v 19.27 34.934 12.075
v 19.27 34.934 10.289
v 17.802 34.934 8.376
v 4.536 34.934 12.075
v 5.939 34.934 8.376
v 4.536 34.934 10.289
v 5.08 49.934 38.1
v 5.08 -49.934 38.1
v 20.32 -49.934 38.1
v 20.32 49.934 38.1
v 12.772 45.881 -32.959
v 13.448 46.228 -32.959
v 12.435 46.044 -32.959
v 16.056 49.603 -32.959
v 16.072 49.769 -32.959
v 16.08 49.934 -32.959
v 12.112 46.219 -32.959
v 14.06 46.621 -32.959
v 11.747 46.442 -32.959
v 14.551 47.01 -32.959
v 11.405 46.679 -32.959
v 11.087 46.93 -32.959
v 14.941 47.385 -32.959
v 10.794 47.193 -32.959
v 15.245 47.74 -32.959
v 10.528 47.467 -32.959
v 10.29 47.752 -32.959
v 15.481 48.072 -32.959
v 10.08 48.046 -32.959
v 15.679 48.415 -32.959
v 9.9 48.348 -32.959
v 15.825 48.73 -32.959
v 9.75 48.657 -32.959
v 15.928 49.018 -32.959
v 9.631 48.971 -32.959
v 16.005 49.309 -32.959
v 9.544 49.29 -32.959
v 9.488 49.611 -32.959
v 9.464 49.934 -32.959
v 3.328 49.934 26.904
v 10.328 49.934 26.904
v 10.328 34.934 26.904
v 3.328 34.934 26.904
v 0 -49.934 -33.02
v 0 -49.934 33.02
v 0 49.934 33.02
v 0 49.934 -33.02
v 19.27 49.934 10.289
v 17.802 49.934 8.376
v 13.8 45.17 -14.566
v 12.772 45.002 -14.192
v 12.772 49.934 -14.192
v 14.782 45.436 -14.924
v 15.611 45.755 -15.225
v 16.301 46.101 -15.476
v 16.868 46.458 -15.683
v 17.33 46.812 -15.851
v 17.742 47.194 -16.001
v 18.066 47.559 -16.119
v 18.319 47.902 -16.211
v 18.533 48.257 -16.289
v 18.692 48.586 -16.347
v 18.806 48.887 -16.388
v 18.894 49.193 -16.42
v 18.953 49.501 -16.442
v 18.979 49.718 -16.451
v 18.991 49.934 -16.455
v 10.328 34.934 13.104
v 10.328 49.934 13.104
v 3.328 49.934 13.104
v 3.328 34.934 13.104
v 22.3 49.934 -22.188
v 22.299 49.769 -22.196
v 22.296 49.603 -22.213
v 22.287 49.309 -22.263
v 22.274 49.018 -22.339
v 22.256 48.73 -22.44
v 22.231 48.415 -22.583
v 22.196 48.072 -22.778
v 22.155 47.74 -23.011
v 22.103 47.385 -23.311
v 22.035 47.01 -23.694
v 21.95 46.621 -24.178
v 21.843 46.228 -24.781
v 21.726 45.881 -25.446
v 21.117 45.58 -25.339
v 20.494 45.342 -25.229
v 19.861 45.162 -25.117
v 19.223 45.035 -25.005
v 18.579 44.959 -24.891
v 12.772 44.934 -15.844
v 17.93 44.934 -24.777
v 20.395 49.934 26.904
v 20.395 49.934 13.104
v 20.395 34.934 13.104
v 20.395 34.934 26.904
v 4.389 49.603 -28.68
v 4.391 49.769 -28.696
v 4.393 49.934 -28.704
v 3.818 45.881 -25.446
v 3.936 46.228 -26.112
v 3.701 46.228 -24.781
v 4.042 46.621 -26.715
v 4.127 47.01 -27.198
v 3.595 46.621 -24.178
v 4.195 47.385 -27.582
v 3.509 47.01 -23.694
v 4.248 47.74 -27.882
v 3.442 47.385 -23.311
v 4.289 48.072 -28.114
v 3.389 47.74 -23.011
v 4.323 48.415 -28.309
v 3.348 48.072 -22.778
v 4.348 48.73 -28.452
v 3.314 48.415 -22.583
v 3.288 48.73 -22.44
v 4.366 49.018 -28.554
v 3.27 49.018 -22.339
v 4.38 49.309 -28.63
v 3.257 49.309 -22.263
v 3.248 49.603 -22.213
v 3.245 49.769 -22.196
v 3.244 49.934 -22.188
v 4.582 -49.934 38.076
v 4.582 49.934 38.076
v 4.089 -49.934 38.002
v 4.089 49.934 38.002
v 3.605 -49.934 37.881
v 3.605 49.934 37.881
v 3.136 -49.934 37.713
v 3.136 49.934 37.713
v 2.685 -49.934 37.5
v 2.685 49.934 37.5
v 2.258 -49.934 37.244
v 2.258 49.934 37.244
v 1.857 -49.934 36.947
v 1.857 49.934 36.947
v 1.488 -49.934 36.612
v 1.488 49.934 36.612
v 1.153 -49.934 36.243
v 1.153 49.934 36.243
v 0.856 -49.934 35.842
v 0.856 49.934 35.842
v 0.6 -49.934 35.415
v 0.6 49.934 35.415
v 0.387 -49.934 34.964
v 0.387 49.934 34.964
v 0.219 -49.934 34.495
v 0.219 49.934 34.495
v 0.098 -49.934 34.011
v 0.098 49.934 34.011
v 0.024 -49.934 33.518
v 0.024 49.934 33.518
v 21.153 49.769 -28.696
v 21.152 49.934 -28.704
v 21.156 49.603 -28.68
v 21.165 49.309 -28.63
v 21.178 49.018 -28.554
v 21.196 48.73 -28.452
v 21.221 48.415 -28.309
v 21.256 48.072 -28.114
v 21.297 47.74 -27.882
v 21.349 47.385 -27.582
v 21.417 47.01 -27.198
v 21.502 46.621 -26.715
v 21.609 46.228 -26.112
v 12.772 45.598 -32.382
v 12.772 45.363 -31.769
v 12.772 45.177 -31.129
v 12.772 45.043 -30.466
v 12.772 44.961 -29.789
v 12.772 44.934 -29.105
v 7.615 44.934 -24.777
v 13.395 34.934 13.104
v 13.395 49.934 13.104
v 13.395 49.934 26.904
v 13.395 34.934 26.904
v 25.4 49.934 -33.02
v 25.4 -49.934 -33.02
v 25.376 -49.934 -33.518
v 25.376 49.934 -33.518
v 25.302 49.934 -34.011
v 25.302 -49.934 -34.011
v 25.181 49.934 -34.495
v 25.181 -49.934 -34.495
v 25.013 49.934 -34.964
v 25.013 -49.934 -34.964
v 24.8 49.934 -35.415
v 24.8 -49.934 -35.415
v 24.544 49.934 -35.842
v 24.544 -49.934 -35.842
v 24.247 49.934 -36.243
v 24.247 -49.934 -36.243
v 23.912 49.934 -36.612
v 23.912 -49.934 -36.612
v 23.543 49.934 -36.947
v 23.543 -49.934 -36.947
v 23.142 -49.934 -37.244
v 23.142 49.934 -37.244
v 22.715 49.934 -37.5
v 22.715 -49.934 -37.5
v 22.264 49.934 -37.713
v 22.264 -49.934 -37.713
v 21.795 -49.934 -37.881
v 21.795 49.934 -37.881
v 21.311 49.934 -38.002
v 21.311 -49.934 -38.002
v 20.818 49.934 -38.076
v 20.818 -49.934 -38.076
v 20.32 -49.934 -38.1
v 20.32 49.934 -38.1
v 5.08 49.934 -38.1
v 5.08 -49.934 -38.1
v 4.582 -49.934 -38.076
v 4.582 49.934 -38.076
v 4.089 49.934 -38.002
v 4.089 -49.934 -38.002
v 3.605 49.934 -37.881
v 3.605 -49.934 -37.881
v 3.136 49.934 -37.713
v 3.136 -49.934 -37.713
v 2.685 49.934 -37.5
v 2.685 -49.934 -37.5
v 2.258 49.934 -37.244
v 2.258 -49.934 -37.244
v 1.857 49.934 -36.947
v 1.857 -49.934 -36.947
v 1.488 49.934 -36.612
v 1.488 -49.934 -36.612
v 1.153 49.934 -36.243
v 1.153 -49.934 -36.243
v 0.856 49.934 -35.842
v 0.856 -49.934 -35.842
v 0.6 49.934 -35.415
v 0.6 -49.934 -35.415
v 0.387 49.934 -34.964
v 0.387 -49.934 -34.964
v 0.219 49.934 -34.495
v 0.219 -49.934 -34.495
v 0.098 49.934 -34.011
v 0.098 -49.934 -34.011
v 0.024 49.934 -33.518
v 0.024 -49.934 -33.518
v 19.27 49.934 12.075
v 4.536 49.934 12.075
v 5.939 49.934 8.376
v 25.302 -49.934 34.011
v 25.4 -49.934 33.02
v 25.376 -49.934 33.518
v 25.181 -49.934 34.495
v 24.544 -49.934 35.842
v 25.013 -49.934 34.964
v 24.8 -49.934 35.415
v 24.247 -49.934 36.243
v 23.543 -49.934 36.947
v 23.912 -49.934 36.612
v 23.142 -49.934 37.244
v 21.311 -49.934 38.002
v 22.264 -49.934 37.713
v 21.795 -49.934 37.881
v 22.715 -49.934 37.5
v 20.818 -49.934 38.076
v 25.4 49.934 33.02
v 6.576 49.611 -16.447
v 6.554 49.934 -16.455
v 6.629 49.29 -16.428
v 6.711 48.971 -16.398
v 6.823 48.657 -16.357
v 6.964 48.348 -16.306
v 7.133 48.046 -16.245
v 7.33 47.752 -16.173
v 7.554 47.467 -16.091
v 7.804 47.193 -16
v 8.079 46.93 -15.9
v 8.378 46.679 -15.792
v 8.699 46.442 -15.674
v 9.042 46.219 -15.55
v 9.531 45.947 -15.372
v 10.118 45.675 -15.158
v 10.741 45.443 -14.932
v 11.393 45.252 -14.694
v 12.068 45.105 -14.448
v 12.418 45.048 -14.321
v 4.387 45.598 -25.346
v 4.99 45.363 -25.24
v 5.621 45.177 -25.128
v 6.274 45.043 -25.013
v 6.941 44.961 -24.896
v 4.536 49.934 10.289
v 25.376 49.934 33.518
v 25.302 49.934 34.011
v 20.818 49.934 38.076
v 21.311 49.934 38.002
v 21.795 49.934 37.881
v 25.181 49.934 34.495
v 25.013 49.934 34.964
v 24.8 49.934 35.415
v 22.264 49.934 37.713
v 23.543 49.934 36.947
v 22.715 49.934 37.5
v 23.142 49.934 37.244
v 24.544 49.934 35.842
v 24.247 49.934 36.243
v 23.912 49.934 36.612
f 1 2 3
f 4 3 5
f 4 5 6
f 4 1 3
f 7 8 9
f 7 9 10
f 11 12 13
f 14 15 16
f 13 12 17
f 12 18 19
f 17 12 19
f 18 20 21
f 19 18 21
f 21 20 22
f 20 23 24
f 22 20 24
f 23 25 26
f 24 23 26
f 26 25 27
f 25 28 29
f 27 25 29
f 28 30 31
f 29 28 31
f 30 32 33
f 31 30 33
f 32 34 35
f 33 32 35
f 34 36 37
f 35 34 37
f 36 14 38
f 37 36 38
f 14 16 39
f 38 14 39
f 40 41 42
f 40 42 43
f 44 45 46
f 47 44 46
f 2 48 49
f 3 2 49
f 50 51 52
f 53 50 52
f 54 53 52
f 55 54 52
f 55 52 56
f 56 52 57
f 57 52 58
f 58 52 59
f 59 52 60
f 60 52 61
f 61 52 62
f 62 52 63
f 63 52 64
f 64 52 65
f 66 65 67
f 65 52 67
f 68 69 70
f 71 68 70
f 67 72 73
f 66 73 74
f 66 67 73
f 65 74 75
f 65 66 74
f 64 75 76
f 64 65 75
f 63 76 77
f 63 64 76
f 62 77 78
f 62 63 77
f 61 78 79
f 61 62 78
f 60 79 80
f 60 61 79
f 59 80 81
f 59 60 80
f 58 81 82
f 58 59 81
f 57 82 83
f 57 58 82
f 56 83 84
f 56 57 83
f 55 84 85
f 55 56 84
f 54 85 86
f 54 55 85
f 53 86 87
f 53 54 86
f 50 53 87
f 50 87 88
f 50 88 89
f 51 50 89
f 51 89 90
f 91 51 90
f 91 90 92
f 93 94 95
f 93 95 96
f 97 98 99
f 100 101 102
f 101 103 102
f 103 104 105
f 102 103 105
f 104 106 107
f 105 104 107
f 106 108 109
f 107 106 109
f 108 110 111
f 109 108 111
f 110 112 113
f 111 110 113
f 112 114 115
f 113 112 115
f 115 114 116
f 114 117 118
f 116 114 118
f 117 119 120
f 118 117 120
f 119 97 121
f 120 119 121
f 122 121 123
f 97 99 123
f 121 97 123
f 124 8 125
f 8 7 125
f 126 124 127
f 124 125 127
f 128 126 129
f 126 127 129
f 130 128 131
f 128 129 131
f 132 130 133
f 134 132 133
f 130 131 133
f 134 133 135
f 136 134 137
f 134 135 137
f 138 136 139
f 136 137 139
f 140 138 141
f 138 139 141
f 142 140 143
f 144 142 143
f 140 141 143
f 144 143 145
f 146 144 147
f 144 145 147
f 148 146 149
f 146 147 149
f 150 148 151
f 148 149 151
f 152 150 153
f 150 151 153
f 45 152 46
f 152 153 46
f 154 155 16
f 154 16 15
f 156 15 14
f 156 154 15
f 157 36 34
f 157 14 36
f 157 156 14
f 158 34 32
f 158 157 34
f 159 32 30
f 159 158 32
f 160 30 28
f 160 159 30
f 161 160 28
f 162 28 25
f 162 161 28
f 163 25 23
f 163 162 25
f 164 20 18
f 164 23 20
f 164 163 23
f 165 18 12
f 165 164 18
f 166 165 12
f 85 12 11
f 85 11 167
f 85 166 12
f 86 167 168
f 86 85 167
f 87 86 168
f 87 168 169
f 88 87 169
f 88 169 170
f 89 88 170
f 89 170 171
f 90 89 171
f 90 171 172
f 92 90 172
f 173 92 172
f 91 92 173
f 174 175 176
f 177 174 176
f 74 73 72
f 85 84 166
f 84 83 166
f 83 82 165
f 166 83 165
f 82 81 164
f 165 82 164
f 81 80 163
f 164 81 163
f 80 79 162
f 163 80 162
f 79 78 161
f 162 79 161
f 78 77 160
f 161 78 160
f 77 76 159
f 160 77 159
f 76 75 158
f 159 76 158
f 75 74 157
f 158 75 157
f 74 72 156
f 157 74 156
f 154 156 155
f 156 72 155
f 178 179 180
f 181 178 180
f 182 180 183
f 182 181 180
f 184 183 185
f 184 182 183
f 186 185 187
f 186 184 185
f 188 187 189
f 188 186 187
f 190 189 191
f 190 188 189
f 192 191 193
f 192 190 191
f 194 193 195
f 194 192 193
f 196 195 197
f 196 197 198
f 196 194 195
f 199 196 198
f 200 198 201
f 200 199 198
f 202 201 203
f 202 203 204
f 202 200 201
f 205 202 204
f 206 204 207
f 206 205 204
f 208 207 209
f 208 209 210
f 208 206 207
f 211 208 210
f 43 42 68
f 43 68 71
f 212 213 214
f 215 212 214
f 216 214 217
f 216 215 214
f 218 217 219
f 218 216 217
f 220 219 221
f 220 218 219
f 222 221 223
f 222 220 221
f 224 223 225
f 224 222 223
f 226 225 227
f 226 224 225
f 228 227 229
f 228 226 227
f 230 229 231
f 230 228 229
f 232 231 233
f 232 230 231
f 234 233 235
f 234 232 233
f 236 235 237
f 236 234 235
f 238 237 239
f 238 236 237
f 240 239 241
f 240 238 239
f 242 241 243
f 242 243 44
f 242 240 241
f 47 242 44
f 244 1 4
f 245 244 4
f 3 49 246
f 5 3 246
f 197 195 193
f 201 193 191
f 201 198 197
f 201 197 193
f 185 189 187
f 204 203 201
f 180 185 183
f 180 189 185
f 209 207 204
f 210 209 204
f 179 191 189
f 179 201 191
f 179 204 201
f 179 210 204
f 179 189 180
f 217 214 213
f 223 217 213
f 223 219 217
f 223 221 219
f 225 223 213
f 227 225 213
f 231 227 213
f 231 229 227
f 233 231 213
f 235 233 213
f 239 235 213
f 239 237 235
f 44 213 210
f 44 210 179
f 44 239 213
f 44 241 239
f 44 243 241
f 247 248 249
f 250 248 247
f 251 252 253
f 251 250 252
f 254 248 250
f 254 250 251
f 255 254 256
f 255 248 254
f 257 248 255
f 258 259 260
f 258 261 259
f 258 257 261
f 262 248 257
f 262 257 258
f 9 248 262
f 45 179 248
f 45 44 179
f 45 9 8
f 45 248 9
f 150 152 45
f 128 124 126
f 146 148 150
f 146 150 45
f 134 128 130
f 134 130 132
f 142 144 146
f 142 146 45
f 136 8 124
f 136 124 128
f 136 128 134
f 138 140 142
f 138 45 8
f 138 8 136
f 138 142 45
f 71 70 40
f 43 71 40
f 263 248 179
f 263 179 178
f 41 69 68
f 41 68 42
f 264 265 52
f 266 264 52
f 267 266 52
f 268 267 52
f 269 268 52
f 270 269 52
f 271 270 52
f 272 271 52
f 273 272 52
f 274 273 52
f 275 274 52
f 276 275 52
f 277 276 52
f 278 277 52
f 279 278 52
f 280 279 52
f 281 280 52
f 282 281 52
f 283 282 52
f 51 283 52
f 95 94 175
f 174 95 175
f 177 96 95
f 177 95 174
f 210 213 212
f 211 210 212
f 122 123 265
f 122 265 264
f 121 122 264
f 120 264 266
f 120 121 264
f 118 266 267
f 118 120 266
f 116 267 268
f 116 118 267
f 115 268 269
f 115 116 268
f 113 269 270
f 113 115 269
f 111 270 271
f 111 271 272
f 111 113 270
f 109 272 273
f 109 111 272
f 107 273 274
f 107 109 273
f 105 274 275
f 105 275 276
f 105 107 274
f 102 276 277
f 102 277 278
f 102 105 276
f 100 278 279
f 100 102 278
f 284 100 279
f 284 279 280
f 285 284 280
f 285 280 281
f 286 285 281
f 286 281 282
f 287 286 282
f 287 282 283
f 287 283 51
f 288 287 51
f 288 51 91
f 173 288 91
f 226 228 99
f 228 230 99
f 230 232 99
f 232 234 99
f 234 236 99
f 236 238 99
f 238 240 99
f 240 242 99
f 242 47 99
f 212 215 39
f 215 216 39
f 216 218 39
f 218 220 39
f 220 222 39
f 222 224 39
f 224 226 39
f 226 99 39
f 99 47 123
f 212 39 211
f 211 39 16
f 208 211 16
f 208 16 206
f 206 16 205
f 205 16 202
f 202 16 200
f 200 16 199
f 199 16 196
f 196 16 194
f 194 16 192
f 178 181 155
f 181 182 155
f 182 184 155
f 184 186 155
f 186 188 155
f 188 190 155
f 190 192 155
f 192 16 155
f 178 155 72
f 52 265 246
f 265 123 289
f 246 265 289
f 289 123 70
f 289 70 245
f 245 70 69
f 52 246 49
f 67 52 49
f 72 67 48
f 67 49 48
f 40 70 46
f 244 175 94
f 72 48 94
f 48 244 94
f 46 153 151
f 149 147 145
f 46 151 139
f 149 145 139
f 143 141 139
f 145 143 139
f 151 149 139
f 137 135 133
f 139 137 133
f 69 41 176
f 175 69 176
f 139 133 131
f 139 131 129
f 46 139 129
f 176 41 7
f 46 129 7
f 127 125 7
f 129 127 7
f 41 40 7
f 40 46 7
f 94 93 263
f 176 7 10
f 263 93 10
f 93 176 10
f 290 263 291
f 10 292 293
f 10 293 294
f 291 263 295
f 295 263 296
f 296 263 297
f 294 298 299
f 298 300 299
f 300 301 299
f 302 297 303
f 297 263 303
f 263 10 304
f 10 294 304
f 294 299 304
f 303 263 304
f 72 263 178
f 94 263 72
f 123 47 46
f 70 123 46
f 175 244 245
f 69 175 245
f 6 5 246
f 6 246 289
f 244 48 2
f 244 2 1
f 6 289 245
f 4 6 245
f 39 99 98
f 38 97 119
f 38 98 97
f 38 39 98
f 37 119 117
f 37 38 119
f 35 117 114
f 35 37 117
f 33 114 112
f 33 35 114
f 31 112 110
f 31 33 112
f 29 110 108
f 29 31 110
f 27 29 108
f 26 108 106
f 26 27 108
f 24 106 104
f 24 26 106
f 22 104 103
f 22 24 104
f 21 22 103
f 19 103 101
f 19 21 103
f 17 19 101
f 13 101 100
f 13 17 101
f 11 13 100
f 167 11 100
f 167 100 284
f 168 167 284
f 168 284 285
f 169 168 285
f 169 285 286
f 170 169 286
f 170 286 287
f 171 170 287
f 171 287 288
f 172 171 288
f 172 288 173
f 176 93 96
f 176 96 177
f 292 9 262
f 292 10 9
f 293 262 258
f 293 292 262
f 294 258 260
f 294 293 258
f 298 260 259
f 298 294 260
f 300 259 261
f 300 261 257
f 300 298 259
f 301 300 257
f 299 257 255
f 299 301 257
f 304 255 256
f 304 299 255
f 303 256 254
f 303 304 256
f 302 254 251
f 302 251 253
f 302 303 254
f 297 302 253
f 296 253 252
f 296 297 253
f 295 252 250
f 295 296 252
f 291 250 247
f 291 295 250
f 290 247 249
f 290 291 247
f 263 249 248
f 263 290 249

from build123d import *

# Parameters (mm, degrees)
F0_W          = 99.8685956001
F0_H          = 76.2
F1_DEPTH      = 25.4
F2_R          = 5.08
F3_R          = 5.08
F4_R          = 5.08
F5_R          = 5.08
F6_W          = 7
F6_H          = 13.8
F7_DEPTH      = 15
F8_W          = 14.7339338437
F8_H          = 1.7859311774
F9_DEPTH      = 15
F11_DEPTH     = 5
F12_T4_DEPTH  = 32.018367851
F12_T10_DEPTH = 32.018367851
F12_T17_DEPTH = 32.018367851
F12_T23_DEPTH = 32.018367851


# Not quite as in the source:
# - a fillet or chamfer that OpenCascade refuses, or shapes differently, is made with other operations: its cross-section is extruded or revolved along the edge and cut away or added


with BuildPart() as f1:
    # F0 (on Right) → F1 (new body)
    with BuildSketch(Plane.YZ):
        Rectangle(F0_W, F0_H)
    extrude(amount=F1_DEPTH)

    # F2
    f2_edges = [f1.edges().sort_by_distance(p)[0] for p in [
        (25.4, 0, 38.1),
    ]]
    fillet(f2_edges, radius=F2_R)

    # F3
    f3_edges = [f1.edges().sort_by_distance(p)[0] for p in [
        (0, 0, 38.1),
    ]]
    fillet(f3_edges, radius=F3_R)

    # F4
    f4_edges = [f1.edges().sort_by_distance(p)[0] for p in [
        (25.4, 0, -38.1),
    ]]
    fillet(f4_edges, radius=F4_R)

    # F5
    f5_edges = [f1.edges().sort_by_distance(p)[0] for p in [
        (0, 0, -38.1),
    ]]
    fillet(f5_edges, radius=F5_R)

    # F6 (on face) → F7 (cut)
    with BuildSketch(Plane(origin=(0, 49.9342978001, 0), x_dir=(-1, 0, 0), z_dir=(0, 1, 0))):
        with Locations((-6.8276954116, 20.0042553112)):
            Rectangle(F6_W, F6_H)
        with Locations((-16.8951429576, 20.0042553112)):
            Rectangle(F6_W, F6_H)
    extrude(amount=-F7_DEPTH, mode=Mode.SUBTRACT)

    # F8 (on face) → F9 (cut)
    with BuildSketch(Plane(origin=(0, 49.9342978001, 0), x_dir=(-1, 0, 0), z_dir=(0, 1, 0))):
        with Locations((-11.9025348686, 11.1820721067)):
            Rectangle(F8_W, F8_H)
        Polygon((-4.5355679467, 10.289106518), (-19.2695017904, 10.289106518), (-17.8024861962, 8.3756083623), (-5.9387991205, 8.3756083623), align=None)
    extrude(amount=-F9_DEPTH, mode=Mode.SUBTRACT)

    # F10 (on face) → F11 (cut)
    with BuildSketch(Plane(origin=(0, 49.9342978001, 0), x_dir=(-1, 0, 0), z_dir=(0, 1, 0))):
        Polygon((-16.0813947992, -32.9593643546), (-9.4630269482, -32.9593643546), (-4.3930630334, -28.7051595036), (-3.2437955169, -22.1873395316), (-6.5529794424, -16.4556648411), (-12.7722108737, -14.1920497201), (-18.9914423049, -16.4556648411), (-22.3006262304, -22.1873395316), (-21.151358714, -28.7051595036), align=None)
    extrude(amount=-F11_DEPTH, mode=Mode.SUBTRACT)

    # F12: fillet of radius 5.08 on 4 edges, made by hand


with BuildPart() as f12_tool2:
    # F12_s3 → F12_t4 (new body)
    with BuildSketch(Plane(origin=(5.5233724705, 0, -9.566761748), x_dir=(0, 1, 0), z_dir=(0.5, 0, -0.8660254038))):
        with BuildLine():
            ThreePointArc((50.0142978001, 8.21923907), (46.4221953516, 6.7313415185), (44.9342978001, 3.13923907))
            Line((44.9342978001, 3.13923907), (44.9342978001, 8.21923907))
            Line((44.9342978001, 8.21923907), (50.0142978001, 8.21923907))
        make_face()
    extrude(amount=F12_T4_DEPTH)

    split(bisect_by=Plane.XZ.offset(-49.9342978001), keep=Keep.TOP)

    split(bisect_by=Plane(origin=(25.4224385924, 0, -4.4826618392), x_dir=(0, 1, 0), z_dir=(-0.984807753, 0, 0.1736481777)), keep=Keep.TOP)


with BuildPart() as f1_1:
    add(f1.part)

    # F12_t1: union F12_tool2
    add(f12_tool2.part)


with BuildPart() as f12_tool8:
    # F12_s9 → F12_t10 (new body)
    with BuildSketch(Plane(origin=(31.5112153695, 0, -26.4410491945), x_dir=(0, 1, 0), z_dir=(-0.7660444431, 0, 0.6427876097))):
        with BuildLine():
            ThreePointArc((50.0142978001, 19.1656214402), (46.4221953516, 17.6777238886), (44.9342978001, 14.0856214402))
            Line((44.9342978001, 14.0856214402), (44.9342978001, 19.1656214402))
            Line((44.9342978001, 19.1656214402), (50.0142978001, 19.1656214402))
        make_face()
    extrude(amount=F12_T10_DEPTH)

    split(bisect_by=Plane.XZ.offset(-49.9342978001), keep=Keep.TOP)

    split(bisect_by=Plane(origin=(-0.6482754096, 0, -0.1143084456), x_dir=(0, 1, 0), z_dir=(0.984807753, 0, 0.1736481777)), keep=Keep.TOP)

    split(bisect_by=Plane.XY.offset(-32.9593643546), keep=Keep.TOP)


with BuildPart() as f1_2:
    add(f1_1.part)

    # F12_t7: union F12_tool8
    add(f12_tool8.part)


with BuildPart() as f12_tool15:
    # F12_s16 → F12_t17 (new body)
    with BuildSketch(Plane(origin=(-15.1464509592, 0, -26.2344226156), x_dir=(0, 1, 0), z_dir=(0.5, 0, 0.8660254038))):
        with BuildLine():
            ThreePointArc((50.0142978001, -13.9028790881), (46.4221953516, -15.3907766397), (44.9342978001, -18.9828790881))
            Line((44.9342978001, -18.9828790881), (44.9342978001, -13.9028790881))
            Line((44.9342978001, -13.9028790881), (50.0142978001, -13.9028790881))
        make_face()
    extrude(amount=F12_T17_DEPTH)

    split(bisect_by=Plane.XZ.offset(-49.9342978001), keep=Keep.TOP)

    split(bisect_by=Plane(origin=(-12.3194239937, 0, -14.6817178032), x_dir=(0, 1, 0), z_dir=(0.6427876097, 0, 0.7660444431)), keep=Keep.TOP)


with BuildPart() as f1_3:
    add(f1_2.part)

    # F12_t14: union F12_tool15
    add(f12_tool15.part)


with BuildPart() as f12_tool21:
    # F12_s22 → F12_t23 (new body)
    with BuildSketch(Plane(origin=(8.0063594172, 0, 6.7181332341), x_dir=(0, 1, 0), z_dir=(-0.7660444431, 0, -0.6427876097))):
        with BuildLine():
            ThreePointArc((50.0142978001, 35.585259236), (46.4221953516, 34.0973616844), (44.9342978001, 30.505259236))
            Line((44.9342978001, 30.505259236), (44.9342978001, 35.585259236))
            Line((44.9342978001, 35.585259236), (50.0142978001, 35.585259236))
        make_face()
    extrude(amount=F12_T23_DEPTH)

    split(bisect_by=Plane.XZ.offset(-49.9342978001), keep=Keep.TOP)

    split(bisect_by=Plane(origin=(7.1180698344, 0, 4.109619535), x_dir=(0, 1, 0), z_dir=(-0.8660254038, 0, -0.5)), keep=Keep.TOP)

    split(bisect_by=Plane.XY.offset(-32.9593643546), keep=Keep.TOP)


with BuildPart() as f1_4:
    add(f1_3.part)

    # F12_t20: union F12_tool21
    add(f12_tool21.part)


solid = f1_4.part
